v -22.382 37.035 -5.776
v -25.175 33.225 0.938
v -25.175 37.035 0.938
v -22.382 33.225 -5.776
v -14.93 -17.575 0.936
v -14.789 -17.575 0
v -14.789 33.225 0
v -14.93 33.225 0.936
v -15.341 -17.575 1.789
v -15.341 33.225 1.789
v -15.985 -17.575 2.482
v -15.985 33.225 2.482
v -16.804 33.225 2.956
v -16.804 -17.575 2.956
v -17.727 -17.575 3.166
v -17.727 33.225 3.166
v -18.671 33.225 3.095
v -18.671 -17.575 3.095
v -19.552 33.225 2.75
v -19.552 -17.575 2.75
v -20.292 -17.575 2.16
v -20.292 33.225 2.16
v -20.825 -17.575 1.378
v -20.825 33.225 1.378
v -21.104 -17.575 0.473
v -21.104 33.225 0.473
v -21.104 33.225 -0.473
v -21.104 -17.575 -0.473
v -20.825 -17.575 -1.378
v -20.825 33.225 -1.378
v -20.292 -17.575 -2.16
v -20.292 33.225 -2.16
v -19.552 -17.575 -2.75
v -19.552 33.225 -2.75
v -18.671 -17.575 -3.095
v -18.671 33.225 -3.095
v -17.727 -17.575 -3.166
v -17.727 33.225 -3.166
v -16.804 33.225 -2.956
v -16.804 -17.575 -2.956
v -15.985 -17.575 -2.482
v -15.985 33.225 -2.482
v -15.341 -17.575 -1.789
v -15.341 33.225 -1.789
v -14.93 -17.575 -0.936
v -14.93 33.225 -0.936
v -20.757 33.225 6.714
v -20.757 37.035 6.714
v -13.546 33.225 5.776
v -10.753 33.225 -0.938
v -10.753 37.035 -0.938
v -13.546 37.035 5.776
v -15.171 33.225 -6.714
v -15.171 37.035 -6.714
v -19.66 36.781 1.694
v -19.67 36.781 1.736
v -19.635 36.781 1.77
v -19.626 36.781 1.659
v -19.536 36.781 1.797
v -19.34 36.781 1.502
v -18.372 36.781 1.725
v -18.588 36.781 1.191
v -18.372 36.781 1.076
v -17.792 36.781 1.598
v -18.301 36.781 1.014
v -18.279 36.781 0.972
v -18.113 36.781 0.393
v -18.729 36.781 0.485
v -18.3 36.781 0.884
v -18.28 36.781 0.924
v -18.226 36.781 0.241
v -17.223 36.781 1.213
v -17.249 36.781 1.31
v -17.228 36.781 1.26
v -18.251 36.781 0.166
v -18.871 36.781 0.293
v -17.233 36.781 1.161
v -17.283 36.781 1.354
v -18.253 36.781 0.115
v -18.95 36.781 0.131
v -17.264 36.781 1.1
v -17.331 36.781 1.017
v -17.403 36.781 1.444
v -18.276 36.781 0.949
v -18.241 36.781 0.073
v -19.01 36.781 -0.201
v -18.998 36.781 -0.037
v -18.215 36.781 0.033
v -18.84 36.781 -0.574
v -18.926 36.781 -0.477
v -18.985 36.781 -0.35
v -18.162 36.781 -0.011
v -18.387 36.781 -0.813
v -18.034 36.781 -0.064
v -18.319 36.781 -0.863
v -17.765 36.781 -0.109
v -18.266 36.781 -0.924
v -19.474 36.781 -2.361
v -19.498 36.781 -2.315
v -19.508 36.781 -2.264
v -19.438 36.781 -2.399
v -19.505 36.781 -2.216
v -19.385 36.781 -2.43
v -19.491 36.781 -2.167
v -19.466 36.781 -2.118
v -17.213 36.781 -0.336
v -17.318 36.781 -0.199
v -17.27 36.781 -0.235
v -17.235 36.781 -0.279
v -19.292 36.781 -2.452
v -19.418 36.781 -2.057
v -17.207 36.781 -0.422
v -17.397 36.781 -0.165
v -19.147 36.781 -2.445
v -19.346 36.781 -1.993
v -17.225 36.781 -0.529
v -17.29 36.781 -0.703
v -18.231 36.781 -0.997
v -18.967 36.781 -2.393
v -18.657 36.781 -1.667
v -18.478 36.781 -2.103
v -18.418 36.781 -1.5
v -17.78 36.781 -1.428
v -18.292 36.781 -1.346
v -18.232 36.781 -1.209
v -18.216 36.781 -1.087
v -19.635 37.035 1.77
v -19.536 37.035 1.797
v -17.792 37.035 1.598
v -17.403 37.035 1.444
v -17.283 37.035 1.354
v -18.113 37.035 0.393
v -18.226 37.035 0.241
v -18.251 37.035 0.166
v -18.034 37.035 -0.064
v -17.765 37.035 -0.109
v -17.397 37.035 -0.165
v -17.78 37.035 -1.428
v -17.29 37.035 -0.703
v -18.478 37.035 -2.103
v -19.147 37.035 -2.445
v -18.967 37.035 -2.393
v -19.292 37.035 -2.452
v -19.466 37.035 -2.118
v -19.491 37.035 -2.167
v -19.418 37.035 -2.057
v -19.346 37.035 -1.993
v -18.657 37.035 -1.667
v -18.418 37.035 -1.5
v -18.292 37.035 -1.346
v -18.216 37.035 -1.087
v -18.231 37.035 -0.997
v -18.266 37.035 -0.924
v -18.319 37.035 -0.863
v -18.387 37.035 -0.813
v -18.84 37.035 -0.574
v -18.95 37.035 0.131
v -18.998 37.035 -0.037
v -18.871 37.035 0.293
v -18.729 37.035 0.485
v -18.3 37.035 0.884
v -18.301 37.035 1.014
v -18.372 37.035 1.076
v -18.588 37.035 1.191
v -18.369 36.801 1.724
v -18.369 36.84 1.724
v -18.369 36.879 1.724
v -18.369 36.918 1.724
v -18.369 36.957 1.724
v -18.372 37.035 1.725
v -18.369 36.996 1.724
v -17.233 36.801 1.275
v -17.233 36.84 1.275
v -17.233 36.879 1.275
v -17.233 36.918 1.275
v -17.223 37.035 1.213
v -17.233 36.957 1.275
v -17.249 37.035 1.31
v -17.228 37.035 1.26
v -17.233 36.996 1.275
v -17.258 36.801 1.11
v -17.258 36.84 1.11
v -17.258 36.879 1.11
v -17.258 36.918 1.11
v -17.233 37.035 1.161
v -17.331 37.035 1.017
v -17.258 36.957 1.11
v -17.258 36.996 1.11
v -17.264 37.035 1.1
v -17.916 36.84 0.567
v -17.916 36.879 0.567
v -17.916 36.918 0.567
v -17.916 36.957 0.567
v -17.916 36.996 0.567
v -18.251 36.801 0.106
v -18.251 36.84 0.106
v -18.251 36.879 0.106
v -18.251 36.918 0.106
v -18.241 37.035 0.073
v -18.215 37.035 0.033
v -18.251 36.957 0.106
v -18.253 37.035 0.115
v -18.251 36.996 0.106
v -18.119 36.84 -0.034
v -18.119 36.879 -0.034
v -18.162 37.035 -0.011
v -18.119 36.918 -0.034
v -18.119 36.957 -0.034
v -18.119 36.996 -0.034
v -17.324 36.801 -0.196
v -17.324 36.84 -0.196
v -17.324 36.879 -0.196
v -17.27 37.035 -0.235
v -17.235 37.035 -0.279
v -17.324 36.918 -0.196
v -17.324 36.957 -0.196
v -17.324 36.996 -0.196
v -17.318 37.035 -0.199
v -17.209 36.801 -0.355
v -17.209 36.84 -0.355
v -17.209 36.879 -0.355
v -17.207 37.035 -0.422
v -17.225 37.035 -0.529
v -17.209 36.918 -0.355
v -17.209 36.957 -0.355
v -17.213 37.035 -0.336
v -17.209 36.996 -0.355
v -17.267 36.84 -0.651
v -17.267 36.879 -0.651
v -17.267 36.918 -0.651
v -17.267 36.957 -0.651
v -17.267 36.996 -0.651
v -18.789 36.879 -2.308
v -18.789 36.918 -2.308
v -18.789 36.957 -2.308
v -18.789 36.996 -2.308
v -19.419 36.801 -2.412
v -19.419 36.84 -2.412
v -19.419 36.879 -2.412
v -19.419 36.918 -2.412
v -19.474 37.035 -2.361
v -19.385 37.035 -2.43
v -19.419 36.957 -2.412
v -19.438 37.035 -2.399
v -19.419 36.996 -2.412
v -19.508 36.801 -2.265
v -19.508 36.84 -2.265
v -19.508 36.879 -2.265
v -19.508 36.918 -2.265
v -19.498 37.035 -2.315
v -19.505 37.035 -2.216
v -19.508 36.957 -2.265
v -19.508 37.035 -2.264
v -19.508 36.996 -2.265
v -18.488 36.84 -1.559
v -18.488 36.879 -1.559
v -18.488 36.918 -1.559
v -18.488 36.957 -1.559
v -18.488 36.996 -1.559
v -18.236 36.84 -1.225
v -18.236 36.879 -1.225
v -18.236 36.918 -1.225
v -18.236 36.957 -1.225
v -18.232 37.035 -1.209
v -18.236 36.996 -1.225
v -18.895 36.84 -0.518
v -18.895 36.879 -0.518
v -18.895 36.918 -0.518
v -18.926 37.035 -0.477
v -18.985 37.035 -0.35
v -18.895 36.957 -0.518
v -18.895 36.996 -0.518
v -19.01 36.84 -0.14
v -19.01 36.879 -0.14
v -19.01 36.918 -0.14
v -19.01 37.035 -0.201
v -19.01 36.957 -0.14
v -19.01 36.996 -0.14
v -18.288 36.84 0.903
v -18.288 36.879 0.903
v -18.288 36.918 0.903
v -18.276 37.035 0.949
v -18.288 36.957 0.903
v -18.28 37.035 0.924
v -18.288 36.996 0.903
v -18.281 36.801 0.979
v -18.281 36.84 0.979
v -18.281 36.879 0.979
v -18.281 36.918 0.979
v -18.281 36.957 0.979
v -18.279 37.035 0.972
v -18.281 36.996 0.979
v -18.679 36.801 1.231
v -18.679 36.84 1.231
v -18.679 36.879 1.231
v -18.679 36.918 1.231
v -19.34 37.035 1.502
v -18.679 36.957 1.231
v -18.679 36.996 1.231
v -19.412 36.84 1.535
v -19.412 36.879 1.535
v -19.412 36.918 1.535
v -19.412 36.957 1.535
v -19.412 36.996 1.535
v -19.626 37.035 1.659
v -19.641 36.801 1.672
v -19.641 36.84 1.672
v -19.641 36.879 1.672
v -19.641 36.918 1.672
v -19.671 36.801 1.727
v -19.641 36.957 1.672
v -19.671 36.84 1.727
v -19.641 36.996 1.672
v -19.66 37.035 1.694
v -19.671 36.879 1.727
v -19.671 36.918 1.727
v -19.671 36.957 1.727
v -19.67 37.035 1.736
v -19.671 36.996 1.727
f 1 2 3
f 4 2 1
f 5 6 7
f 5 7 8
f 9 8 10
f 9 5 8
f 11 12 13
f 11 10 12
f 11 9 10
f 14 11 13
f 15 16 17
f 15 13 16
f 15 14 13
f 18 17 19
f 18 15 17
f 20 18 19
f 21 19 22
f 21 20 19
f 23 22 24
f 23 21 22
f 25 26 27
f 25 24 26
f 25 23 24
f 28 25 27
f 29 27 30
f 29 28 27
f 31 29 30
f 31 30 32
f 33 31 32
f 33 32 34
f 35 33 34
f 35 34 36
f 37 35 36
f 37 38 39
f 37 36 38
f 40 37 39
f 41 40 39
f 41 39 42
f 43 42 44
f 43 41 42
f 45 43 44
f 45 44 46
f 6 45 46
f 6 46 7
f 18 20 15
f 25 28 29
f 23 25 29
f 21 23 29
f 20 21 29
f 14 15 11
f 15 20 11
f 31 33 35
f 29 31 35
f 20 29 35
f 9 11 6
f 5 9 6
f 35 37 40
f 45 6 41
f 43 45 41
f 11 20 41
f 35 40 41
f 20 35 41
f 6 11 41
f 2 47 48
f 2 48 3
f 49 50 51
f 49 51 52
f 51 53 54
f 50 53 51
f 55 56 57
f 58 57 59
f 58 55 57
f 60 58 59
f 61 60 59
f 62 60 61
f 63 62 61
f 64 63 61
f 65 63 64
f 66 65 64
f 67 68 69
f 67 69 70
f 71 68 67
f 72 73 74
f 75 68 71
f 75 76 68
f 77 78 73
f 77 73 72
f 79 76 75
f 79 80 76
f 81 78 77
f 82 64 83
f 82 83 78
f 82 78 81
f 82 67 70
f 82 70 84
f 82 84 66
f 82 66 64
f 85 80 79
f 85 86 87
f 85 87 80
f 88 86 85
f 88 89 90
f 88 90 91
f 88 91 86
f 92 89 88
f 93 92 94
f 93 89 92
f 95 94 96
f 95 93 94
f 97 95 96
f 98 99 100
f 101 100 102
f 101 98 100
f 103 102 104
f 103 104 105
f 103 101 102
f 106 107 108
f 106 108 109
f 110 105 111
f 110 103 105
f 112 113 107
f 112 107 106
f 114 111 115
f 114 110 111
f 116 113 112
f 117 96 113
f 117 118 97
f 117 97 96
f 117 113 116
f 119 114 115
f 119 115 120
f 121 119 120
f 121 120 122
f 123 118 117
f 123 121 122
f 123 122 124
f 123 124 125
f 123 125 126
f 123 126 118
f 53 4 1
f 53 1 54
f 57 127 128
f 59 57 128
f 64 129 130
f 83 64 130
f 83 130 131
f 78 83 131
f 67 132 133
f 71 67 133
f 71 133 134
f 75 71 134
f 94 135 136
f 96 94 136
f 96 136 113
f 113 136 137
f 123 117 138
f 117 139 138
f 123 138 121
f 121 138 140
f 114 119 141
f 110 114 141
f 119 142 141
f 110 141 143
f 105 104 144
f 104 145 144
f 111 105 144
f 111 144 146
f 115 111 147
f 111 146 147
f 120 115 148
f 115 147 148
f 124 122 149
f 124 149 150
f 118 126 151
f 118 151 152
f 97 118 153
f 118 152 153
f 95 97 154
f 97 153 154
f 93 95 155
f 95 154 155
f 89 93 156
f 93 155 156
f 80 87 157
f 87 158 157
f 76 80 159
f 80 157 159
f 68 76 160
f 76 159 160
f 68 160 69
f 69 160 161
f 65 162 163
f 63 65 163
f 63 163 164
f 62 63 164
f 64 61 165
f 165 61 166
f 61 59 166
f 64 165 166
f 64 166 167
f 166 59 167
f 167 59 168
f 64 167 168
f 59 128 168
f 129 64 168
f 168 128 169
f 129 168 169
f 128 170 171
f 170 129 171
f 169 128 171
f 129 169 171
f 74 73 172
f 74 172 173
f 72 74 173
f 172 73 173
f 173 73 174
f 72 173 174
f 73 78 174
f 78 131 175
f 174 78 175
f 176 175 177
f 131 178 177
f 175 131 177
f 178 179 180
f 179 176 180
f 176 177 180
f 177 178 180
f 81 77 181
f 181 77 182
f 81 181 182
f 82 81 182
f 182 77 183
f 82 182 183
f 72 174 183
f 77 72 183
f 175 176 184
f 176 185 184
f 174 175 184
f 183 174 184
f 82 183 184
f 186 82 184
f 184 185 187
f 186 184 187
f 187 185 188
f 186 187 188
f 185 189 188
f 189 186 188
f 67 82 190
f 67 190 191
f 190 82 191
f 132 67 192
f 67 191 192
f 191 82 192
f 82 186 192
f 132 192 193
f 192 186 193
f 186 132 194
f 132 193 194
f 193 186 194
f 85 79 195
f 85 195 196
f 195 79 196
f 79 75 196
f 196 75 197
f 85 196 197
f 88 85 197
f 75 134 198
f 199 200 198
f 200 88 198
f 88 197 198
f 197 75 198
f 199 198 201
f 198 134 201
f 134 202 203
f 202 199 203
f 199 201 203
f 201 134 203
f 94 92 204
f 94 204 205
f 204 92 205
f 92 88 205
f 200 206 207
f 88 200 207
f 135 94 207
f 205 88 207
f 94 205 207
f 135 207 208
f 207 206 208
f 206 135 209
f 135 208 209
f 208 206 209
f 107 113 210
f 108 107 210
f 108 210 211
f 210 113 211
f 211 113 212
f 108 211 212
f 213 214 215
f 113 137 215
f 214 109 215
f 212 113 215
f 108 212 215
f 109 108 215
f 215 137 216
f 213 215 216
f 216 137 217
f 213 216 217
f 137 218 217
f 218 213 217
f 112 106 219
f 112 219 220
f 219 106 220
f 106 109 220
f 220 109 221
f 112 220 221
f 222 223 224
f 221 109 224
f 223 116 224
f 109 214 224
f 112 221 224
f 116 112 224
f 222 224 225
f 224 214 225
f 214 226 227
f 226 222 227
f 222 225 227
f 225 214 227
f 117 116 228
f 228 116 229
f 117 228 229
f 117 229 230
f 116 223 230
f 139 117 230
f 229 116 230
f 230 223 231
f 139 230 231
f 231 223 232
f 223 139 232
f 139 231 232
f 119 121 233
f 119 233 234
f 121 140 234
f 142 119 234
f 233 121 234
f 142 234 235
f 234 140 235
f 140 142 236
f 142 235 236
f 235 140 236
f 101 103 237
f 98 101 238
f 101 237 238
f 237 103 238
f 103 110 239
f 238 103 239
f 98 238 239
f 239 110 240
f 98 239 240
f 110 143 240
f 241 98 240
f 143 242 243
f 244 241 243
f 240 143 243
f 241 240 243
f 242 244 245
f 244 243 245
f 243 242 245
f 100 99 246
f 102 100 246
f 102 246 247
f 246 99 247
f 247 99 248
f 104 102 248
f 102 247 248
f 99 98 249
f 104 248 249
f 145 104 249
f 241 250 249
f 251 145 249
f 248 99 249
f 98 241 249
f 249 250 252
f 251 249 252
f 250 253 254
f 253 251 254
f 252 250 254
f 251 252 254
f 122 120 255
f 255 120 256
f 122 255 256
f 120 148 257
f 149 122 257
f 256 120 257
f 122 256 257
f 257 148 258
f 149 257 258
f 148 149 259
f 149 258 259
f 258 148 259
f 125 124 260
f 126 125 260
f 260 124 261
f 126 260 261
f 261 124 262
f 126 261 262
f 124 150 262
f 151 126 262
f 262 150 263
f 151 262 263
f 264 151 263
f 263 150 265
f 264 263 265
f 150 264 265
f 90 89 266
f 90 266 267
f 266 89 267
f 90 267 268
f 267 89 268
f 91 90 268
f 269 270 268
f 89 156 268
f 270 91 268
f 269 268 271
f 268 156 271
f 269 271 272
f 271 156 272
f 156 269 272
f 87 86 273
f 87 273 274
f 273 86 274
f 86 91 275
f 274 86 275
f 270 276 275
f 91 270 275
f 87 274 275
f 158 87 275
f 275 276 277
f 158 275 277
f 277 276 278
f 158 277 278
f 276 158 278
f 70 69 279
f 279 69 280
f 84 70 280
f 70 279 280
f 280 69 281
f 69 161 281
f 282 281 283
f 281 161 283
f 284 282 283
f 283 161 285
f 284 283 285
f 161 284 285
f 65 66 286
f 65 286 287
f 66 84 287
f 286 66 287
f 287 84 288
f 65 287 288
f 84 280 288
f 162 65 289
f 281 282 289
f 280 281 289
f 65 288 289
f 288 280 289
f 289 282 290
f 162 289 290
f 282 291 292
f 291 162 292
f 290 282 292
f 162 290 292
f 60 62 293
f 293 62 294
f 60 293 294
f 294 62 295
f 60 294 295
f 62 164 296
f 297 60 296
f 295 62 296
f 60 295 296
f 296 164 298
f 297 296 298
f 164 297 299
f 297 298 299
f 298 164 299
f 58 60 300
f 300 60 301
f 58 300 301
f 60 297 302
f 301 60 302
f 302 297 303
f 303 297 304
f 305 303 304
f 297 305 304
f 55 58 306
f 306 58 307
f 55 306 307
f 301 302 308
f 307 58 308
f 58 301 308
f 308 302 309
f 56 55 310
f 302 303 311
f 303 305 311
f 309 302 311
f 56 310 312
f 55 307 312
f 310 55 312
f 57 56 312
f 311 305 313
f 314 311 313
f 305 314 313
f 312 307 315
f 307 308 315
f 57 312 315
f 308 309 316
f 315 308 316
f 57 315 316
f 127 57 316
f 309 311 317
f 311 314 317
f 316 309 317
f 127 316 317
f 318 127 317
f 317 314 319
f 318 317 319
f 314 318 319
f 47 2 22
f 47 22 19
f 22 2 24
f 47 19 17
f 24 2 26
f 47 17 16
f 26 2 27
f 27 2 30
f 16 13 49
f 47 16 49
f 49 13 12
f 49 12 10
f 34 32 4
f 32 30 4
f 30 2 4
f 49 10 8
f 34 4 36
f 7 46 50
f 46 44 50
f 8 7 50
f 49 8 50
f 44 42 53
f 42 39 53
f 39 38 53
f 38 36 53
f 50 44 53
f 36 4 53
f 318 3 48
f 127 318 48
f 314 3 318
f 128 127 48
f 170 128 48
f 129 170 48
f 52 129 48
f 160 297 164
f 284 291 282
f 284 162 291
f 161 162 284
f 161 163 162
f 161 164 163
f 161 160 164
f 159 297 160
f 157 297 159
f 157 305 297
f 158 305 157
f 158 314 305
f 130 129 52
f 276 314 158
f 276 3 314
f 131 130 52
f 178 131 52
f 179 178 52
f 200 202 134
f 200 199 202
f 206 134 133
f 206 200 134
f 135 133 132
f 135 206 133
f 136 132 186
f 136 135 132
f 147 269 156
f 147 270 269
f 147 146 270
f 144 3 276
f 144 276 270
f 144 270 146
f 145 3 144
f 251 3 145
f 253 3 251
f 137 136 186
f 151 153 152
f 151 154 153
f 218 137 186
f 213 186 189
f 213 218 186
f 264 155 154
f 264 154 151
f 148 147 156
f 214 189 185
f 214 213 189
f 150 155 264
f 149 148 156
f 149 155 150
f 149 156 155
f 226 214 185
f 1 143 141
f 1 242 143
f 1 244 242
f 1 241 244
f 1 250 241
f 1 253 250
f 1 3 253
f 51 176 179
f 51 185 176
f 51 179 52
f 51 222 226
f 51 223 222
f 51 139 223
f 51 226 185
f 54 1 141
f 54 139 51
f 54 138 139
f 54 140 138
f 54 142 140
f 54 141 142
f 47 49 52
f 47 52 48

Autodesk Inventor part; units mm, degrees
ref_plane "YZ Plane" through (0, 0, 0) normal (1, 0, 0) x (0, 1, 0)
ref_plane "XZ Plane" through (0, 0, 0) normal (0, 1, 0) x (-1, 0, 0)
ref_plane "XY Plane" through (0, 0, 0) normal (0, 0, 1) x (1, 0, 0)
sketch "Sketch1" plane through (0, 0, 0) normal (0, 0, 1) x (1, 0, 0)
  line L0 (-17.9641, 33.2251) -> (-14.7891, 33.2251)
  line L1 (-14.7891, 33.2251) -> (-14.7891, -17.5749)
  line L2 (-14.7891, -17.5749) -> (-17.9641, -17.5749)
  line L3 (-17.9641, -17.5749) -> (-17.9641, 33.2251)
  point P0 (0, 0)
  dimension "d0" = 3.175
  dimension "d1" = 50.8
revolve "Revolution1" add sketch "Sketch1" angle 360 about axis through (-17.9641, -17.5749, 0) along (0, 1, 0)
sketch "Sketch2" plane through (-17.9641, 33.2251, 0) normal (0, 1, 0) x (1, 0, 0)
  circle A0 centre (0, 0) radius 3.175 projected
  line L0 (-2.7933, -6.7141) -> (-7.2112, -0.938)
  line L1 (-7.2112, -0.938) -> (-4.418, 5.7761)
  line L2 (-4.418, 5.7761) -> (2.7933, 6.7141)
  line L3 (2.7933, 6.7141) -> (7.2112, 0.938)
  line L4 (7.2112, 0.938) -> (4.418, -5.7761)
  line L5 (4.418, -5.7761) -> (-2.7933, -6.7141)
  point P0 (17.9641, 0)
extrude "Extrusion1" add sketch "Sketch2" along normal blind 3.81 contours A0 | L0 L1 L2 L3 L4 L5
thread "Thread1" size "1/4-20 UNC" class "2A" standard "ANSI Unified Screw Threads" full length
sketch "Sketch3" plane through (-17.9641, 37.0351, 0) normal (0, 1, 0) x (1, 0, 0)
  spline S0 degree 5 poles (-1.6705, -1.7697) (-1.5087, -1.85) (-0.562, -1.832) (2.4108, -1.3359) (-1.0538, -0.5942) (-0.3082, 0.5963) (2.0933, -0.7076) (-1.4851, 3.8244) (-2.0876, 1.526) (-0.2865, 2.0954) (0.0858, 0.4541) (-1.2327, 0.9989) (-1.1868, -0.5585) (0.1138, -0.9114) (-0.367, -1.1465) (-1.6028, -1.5407) (-1.7853, -1.7128) (-1.6705, -1.7697) knots 0 0 0 0 0 0 0.118263 0.184405 0.277398 0.35545 0.432093 0.511849 0.589546 0.655005 0.725096 0.791185 0.859928 0.916088 1 1 1 1 1 1
  point P0 (17.9641, 0)
  point P1 (-0.2467, -0.2687)
  point P2 (-0.1215, 0.0477)
  point P3 (0.7392, 0.3)
  point P4 (-1.3859, 2.4418)
  point P5 (-1.4827, 2.0902)
  point P6 (-0.4576, 1.5038)
  point P7 (-0.3161, 0.9046)
  point P8 (-0.8855, 0.5658)
  point P9 (-0.8855, -0.3278)
  point P10 (-0.3187, -0.9153)
  point P11 (-0.8855, -1.3006)
extrude "Extrusion2" cut sketch "Sketch3" against normal blind 0.254
properties part number ".25 diameter 2'' bolt"
